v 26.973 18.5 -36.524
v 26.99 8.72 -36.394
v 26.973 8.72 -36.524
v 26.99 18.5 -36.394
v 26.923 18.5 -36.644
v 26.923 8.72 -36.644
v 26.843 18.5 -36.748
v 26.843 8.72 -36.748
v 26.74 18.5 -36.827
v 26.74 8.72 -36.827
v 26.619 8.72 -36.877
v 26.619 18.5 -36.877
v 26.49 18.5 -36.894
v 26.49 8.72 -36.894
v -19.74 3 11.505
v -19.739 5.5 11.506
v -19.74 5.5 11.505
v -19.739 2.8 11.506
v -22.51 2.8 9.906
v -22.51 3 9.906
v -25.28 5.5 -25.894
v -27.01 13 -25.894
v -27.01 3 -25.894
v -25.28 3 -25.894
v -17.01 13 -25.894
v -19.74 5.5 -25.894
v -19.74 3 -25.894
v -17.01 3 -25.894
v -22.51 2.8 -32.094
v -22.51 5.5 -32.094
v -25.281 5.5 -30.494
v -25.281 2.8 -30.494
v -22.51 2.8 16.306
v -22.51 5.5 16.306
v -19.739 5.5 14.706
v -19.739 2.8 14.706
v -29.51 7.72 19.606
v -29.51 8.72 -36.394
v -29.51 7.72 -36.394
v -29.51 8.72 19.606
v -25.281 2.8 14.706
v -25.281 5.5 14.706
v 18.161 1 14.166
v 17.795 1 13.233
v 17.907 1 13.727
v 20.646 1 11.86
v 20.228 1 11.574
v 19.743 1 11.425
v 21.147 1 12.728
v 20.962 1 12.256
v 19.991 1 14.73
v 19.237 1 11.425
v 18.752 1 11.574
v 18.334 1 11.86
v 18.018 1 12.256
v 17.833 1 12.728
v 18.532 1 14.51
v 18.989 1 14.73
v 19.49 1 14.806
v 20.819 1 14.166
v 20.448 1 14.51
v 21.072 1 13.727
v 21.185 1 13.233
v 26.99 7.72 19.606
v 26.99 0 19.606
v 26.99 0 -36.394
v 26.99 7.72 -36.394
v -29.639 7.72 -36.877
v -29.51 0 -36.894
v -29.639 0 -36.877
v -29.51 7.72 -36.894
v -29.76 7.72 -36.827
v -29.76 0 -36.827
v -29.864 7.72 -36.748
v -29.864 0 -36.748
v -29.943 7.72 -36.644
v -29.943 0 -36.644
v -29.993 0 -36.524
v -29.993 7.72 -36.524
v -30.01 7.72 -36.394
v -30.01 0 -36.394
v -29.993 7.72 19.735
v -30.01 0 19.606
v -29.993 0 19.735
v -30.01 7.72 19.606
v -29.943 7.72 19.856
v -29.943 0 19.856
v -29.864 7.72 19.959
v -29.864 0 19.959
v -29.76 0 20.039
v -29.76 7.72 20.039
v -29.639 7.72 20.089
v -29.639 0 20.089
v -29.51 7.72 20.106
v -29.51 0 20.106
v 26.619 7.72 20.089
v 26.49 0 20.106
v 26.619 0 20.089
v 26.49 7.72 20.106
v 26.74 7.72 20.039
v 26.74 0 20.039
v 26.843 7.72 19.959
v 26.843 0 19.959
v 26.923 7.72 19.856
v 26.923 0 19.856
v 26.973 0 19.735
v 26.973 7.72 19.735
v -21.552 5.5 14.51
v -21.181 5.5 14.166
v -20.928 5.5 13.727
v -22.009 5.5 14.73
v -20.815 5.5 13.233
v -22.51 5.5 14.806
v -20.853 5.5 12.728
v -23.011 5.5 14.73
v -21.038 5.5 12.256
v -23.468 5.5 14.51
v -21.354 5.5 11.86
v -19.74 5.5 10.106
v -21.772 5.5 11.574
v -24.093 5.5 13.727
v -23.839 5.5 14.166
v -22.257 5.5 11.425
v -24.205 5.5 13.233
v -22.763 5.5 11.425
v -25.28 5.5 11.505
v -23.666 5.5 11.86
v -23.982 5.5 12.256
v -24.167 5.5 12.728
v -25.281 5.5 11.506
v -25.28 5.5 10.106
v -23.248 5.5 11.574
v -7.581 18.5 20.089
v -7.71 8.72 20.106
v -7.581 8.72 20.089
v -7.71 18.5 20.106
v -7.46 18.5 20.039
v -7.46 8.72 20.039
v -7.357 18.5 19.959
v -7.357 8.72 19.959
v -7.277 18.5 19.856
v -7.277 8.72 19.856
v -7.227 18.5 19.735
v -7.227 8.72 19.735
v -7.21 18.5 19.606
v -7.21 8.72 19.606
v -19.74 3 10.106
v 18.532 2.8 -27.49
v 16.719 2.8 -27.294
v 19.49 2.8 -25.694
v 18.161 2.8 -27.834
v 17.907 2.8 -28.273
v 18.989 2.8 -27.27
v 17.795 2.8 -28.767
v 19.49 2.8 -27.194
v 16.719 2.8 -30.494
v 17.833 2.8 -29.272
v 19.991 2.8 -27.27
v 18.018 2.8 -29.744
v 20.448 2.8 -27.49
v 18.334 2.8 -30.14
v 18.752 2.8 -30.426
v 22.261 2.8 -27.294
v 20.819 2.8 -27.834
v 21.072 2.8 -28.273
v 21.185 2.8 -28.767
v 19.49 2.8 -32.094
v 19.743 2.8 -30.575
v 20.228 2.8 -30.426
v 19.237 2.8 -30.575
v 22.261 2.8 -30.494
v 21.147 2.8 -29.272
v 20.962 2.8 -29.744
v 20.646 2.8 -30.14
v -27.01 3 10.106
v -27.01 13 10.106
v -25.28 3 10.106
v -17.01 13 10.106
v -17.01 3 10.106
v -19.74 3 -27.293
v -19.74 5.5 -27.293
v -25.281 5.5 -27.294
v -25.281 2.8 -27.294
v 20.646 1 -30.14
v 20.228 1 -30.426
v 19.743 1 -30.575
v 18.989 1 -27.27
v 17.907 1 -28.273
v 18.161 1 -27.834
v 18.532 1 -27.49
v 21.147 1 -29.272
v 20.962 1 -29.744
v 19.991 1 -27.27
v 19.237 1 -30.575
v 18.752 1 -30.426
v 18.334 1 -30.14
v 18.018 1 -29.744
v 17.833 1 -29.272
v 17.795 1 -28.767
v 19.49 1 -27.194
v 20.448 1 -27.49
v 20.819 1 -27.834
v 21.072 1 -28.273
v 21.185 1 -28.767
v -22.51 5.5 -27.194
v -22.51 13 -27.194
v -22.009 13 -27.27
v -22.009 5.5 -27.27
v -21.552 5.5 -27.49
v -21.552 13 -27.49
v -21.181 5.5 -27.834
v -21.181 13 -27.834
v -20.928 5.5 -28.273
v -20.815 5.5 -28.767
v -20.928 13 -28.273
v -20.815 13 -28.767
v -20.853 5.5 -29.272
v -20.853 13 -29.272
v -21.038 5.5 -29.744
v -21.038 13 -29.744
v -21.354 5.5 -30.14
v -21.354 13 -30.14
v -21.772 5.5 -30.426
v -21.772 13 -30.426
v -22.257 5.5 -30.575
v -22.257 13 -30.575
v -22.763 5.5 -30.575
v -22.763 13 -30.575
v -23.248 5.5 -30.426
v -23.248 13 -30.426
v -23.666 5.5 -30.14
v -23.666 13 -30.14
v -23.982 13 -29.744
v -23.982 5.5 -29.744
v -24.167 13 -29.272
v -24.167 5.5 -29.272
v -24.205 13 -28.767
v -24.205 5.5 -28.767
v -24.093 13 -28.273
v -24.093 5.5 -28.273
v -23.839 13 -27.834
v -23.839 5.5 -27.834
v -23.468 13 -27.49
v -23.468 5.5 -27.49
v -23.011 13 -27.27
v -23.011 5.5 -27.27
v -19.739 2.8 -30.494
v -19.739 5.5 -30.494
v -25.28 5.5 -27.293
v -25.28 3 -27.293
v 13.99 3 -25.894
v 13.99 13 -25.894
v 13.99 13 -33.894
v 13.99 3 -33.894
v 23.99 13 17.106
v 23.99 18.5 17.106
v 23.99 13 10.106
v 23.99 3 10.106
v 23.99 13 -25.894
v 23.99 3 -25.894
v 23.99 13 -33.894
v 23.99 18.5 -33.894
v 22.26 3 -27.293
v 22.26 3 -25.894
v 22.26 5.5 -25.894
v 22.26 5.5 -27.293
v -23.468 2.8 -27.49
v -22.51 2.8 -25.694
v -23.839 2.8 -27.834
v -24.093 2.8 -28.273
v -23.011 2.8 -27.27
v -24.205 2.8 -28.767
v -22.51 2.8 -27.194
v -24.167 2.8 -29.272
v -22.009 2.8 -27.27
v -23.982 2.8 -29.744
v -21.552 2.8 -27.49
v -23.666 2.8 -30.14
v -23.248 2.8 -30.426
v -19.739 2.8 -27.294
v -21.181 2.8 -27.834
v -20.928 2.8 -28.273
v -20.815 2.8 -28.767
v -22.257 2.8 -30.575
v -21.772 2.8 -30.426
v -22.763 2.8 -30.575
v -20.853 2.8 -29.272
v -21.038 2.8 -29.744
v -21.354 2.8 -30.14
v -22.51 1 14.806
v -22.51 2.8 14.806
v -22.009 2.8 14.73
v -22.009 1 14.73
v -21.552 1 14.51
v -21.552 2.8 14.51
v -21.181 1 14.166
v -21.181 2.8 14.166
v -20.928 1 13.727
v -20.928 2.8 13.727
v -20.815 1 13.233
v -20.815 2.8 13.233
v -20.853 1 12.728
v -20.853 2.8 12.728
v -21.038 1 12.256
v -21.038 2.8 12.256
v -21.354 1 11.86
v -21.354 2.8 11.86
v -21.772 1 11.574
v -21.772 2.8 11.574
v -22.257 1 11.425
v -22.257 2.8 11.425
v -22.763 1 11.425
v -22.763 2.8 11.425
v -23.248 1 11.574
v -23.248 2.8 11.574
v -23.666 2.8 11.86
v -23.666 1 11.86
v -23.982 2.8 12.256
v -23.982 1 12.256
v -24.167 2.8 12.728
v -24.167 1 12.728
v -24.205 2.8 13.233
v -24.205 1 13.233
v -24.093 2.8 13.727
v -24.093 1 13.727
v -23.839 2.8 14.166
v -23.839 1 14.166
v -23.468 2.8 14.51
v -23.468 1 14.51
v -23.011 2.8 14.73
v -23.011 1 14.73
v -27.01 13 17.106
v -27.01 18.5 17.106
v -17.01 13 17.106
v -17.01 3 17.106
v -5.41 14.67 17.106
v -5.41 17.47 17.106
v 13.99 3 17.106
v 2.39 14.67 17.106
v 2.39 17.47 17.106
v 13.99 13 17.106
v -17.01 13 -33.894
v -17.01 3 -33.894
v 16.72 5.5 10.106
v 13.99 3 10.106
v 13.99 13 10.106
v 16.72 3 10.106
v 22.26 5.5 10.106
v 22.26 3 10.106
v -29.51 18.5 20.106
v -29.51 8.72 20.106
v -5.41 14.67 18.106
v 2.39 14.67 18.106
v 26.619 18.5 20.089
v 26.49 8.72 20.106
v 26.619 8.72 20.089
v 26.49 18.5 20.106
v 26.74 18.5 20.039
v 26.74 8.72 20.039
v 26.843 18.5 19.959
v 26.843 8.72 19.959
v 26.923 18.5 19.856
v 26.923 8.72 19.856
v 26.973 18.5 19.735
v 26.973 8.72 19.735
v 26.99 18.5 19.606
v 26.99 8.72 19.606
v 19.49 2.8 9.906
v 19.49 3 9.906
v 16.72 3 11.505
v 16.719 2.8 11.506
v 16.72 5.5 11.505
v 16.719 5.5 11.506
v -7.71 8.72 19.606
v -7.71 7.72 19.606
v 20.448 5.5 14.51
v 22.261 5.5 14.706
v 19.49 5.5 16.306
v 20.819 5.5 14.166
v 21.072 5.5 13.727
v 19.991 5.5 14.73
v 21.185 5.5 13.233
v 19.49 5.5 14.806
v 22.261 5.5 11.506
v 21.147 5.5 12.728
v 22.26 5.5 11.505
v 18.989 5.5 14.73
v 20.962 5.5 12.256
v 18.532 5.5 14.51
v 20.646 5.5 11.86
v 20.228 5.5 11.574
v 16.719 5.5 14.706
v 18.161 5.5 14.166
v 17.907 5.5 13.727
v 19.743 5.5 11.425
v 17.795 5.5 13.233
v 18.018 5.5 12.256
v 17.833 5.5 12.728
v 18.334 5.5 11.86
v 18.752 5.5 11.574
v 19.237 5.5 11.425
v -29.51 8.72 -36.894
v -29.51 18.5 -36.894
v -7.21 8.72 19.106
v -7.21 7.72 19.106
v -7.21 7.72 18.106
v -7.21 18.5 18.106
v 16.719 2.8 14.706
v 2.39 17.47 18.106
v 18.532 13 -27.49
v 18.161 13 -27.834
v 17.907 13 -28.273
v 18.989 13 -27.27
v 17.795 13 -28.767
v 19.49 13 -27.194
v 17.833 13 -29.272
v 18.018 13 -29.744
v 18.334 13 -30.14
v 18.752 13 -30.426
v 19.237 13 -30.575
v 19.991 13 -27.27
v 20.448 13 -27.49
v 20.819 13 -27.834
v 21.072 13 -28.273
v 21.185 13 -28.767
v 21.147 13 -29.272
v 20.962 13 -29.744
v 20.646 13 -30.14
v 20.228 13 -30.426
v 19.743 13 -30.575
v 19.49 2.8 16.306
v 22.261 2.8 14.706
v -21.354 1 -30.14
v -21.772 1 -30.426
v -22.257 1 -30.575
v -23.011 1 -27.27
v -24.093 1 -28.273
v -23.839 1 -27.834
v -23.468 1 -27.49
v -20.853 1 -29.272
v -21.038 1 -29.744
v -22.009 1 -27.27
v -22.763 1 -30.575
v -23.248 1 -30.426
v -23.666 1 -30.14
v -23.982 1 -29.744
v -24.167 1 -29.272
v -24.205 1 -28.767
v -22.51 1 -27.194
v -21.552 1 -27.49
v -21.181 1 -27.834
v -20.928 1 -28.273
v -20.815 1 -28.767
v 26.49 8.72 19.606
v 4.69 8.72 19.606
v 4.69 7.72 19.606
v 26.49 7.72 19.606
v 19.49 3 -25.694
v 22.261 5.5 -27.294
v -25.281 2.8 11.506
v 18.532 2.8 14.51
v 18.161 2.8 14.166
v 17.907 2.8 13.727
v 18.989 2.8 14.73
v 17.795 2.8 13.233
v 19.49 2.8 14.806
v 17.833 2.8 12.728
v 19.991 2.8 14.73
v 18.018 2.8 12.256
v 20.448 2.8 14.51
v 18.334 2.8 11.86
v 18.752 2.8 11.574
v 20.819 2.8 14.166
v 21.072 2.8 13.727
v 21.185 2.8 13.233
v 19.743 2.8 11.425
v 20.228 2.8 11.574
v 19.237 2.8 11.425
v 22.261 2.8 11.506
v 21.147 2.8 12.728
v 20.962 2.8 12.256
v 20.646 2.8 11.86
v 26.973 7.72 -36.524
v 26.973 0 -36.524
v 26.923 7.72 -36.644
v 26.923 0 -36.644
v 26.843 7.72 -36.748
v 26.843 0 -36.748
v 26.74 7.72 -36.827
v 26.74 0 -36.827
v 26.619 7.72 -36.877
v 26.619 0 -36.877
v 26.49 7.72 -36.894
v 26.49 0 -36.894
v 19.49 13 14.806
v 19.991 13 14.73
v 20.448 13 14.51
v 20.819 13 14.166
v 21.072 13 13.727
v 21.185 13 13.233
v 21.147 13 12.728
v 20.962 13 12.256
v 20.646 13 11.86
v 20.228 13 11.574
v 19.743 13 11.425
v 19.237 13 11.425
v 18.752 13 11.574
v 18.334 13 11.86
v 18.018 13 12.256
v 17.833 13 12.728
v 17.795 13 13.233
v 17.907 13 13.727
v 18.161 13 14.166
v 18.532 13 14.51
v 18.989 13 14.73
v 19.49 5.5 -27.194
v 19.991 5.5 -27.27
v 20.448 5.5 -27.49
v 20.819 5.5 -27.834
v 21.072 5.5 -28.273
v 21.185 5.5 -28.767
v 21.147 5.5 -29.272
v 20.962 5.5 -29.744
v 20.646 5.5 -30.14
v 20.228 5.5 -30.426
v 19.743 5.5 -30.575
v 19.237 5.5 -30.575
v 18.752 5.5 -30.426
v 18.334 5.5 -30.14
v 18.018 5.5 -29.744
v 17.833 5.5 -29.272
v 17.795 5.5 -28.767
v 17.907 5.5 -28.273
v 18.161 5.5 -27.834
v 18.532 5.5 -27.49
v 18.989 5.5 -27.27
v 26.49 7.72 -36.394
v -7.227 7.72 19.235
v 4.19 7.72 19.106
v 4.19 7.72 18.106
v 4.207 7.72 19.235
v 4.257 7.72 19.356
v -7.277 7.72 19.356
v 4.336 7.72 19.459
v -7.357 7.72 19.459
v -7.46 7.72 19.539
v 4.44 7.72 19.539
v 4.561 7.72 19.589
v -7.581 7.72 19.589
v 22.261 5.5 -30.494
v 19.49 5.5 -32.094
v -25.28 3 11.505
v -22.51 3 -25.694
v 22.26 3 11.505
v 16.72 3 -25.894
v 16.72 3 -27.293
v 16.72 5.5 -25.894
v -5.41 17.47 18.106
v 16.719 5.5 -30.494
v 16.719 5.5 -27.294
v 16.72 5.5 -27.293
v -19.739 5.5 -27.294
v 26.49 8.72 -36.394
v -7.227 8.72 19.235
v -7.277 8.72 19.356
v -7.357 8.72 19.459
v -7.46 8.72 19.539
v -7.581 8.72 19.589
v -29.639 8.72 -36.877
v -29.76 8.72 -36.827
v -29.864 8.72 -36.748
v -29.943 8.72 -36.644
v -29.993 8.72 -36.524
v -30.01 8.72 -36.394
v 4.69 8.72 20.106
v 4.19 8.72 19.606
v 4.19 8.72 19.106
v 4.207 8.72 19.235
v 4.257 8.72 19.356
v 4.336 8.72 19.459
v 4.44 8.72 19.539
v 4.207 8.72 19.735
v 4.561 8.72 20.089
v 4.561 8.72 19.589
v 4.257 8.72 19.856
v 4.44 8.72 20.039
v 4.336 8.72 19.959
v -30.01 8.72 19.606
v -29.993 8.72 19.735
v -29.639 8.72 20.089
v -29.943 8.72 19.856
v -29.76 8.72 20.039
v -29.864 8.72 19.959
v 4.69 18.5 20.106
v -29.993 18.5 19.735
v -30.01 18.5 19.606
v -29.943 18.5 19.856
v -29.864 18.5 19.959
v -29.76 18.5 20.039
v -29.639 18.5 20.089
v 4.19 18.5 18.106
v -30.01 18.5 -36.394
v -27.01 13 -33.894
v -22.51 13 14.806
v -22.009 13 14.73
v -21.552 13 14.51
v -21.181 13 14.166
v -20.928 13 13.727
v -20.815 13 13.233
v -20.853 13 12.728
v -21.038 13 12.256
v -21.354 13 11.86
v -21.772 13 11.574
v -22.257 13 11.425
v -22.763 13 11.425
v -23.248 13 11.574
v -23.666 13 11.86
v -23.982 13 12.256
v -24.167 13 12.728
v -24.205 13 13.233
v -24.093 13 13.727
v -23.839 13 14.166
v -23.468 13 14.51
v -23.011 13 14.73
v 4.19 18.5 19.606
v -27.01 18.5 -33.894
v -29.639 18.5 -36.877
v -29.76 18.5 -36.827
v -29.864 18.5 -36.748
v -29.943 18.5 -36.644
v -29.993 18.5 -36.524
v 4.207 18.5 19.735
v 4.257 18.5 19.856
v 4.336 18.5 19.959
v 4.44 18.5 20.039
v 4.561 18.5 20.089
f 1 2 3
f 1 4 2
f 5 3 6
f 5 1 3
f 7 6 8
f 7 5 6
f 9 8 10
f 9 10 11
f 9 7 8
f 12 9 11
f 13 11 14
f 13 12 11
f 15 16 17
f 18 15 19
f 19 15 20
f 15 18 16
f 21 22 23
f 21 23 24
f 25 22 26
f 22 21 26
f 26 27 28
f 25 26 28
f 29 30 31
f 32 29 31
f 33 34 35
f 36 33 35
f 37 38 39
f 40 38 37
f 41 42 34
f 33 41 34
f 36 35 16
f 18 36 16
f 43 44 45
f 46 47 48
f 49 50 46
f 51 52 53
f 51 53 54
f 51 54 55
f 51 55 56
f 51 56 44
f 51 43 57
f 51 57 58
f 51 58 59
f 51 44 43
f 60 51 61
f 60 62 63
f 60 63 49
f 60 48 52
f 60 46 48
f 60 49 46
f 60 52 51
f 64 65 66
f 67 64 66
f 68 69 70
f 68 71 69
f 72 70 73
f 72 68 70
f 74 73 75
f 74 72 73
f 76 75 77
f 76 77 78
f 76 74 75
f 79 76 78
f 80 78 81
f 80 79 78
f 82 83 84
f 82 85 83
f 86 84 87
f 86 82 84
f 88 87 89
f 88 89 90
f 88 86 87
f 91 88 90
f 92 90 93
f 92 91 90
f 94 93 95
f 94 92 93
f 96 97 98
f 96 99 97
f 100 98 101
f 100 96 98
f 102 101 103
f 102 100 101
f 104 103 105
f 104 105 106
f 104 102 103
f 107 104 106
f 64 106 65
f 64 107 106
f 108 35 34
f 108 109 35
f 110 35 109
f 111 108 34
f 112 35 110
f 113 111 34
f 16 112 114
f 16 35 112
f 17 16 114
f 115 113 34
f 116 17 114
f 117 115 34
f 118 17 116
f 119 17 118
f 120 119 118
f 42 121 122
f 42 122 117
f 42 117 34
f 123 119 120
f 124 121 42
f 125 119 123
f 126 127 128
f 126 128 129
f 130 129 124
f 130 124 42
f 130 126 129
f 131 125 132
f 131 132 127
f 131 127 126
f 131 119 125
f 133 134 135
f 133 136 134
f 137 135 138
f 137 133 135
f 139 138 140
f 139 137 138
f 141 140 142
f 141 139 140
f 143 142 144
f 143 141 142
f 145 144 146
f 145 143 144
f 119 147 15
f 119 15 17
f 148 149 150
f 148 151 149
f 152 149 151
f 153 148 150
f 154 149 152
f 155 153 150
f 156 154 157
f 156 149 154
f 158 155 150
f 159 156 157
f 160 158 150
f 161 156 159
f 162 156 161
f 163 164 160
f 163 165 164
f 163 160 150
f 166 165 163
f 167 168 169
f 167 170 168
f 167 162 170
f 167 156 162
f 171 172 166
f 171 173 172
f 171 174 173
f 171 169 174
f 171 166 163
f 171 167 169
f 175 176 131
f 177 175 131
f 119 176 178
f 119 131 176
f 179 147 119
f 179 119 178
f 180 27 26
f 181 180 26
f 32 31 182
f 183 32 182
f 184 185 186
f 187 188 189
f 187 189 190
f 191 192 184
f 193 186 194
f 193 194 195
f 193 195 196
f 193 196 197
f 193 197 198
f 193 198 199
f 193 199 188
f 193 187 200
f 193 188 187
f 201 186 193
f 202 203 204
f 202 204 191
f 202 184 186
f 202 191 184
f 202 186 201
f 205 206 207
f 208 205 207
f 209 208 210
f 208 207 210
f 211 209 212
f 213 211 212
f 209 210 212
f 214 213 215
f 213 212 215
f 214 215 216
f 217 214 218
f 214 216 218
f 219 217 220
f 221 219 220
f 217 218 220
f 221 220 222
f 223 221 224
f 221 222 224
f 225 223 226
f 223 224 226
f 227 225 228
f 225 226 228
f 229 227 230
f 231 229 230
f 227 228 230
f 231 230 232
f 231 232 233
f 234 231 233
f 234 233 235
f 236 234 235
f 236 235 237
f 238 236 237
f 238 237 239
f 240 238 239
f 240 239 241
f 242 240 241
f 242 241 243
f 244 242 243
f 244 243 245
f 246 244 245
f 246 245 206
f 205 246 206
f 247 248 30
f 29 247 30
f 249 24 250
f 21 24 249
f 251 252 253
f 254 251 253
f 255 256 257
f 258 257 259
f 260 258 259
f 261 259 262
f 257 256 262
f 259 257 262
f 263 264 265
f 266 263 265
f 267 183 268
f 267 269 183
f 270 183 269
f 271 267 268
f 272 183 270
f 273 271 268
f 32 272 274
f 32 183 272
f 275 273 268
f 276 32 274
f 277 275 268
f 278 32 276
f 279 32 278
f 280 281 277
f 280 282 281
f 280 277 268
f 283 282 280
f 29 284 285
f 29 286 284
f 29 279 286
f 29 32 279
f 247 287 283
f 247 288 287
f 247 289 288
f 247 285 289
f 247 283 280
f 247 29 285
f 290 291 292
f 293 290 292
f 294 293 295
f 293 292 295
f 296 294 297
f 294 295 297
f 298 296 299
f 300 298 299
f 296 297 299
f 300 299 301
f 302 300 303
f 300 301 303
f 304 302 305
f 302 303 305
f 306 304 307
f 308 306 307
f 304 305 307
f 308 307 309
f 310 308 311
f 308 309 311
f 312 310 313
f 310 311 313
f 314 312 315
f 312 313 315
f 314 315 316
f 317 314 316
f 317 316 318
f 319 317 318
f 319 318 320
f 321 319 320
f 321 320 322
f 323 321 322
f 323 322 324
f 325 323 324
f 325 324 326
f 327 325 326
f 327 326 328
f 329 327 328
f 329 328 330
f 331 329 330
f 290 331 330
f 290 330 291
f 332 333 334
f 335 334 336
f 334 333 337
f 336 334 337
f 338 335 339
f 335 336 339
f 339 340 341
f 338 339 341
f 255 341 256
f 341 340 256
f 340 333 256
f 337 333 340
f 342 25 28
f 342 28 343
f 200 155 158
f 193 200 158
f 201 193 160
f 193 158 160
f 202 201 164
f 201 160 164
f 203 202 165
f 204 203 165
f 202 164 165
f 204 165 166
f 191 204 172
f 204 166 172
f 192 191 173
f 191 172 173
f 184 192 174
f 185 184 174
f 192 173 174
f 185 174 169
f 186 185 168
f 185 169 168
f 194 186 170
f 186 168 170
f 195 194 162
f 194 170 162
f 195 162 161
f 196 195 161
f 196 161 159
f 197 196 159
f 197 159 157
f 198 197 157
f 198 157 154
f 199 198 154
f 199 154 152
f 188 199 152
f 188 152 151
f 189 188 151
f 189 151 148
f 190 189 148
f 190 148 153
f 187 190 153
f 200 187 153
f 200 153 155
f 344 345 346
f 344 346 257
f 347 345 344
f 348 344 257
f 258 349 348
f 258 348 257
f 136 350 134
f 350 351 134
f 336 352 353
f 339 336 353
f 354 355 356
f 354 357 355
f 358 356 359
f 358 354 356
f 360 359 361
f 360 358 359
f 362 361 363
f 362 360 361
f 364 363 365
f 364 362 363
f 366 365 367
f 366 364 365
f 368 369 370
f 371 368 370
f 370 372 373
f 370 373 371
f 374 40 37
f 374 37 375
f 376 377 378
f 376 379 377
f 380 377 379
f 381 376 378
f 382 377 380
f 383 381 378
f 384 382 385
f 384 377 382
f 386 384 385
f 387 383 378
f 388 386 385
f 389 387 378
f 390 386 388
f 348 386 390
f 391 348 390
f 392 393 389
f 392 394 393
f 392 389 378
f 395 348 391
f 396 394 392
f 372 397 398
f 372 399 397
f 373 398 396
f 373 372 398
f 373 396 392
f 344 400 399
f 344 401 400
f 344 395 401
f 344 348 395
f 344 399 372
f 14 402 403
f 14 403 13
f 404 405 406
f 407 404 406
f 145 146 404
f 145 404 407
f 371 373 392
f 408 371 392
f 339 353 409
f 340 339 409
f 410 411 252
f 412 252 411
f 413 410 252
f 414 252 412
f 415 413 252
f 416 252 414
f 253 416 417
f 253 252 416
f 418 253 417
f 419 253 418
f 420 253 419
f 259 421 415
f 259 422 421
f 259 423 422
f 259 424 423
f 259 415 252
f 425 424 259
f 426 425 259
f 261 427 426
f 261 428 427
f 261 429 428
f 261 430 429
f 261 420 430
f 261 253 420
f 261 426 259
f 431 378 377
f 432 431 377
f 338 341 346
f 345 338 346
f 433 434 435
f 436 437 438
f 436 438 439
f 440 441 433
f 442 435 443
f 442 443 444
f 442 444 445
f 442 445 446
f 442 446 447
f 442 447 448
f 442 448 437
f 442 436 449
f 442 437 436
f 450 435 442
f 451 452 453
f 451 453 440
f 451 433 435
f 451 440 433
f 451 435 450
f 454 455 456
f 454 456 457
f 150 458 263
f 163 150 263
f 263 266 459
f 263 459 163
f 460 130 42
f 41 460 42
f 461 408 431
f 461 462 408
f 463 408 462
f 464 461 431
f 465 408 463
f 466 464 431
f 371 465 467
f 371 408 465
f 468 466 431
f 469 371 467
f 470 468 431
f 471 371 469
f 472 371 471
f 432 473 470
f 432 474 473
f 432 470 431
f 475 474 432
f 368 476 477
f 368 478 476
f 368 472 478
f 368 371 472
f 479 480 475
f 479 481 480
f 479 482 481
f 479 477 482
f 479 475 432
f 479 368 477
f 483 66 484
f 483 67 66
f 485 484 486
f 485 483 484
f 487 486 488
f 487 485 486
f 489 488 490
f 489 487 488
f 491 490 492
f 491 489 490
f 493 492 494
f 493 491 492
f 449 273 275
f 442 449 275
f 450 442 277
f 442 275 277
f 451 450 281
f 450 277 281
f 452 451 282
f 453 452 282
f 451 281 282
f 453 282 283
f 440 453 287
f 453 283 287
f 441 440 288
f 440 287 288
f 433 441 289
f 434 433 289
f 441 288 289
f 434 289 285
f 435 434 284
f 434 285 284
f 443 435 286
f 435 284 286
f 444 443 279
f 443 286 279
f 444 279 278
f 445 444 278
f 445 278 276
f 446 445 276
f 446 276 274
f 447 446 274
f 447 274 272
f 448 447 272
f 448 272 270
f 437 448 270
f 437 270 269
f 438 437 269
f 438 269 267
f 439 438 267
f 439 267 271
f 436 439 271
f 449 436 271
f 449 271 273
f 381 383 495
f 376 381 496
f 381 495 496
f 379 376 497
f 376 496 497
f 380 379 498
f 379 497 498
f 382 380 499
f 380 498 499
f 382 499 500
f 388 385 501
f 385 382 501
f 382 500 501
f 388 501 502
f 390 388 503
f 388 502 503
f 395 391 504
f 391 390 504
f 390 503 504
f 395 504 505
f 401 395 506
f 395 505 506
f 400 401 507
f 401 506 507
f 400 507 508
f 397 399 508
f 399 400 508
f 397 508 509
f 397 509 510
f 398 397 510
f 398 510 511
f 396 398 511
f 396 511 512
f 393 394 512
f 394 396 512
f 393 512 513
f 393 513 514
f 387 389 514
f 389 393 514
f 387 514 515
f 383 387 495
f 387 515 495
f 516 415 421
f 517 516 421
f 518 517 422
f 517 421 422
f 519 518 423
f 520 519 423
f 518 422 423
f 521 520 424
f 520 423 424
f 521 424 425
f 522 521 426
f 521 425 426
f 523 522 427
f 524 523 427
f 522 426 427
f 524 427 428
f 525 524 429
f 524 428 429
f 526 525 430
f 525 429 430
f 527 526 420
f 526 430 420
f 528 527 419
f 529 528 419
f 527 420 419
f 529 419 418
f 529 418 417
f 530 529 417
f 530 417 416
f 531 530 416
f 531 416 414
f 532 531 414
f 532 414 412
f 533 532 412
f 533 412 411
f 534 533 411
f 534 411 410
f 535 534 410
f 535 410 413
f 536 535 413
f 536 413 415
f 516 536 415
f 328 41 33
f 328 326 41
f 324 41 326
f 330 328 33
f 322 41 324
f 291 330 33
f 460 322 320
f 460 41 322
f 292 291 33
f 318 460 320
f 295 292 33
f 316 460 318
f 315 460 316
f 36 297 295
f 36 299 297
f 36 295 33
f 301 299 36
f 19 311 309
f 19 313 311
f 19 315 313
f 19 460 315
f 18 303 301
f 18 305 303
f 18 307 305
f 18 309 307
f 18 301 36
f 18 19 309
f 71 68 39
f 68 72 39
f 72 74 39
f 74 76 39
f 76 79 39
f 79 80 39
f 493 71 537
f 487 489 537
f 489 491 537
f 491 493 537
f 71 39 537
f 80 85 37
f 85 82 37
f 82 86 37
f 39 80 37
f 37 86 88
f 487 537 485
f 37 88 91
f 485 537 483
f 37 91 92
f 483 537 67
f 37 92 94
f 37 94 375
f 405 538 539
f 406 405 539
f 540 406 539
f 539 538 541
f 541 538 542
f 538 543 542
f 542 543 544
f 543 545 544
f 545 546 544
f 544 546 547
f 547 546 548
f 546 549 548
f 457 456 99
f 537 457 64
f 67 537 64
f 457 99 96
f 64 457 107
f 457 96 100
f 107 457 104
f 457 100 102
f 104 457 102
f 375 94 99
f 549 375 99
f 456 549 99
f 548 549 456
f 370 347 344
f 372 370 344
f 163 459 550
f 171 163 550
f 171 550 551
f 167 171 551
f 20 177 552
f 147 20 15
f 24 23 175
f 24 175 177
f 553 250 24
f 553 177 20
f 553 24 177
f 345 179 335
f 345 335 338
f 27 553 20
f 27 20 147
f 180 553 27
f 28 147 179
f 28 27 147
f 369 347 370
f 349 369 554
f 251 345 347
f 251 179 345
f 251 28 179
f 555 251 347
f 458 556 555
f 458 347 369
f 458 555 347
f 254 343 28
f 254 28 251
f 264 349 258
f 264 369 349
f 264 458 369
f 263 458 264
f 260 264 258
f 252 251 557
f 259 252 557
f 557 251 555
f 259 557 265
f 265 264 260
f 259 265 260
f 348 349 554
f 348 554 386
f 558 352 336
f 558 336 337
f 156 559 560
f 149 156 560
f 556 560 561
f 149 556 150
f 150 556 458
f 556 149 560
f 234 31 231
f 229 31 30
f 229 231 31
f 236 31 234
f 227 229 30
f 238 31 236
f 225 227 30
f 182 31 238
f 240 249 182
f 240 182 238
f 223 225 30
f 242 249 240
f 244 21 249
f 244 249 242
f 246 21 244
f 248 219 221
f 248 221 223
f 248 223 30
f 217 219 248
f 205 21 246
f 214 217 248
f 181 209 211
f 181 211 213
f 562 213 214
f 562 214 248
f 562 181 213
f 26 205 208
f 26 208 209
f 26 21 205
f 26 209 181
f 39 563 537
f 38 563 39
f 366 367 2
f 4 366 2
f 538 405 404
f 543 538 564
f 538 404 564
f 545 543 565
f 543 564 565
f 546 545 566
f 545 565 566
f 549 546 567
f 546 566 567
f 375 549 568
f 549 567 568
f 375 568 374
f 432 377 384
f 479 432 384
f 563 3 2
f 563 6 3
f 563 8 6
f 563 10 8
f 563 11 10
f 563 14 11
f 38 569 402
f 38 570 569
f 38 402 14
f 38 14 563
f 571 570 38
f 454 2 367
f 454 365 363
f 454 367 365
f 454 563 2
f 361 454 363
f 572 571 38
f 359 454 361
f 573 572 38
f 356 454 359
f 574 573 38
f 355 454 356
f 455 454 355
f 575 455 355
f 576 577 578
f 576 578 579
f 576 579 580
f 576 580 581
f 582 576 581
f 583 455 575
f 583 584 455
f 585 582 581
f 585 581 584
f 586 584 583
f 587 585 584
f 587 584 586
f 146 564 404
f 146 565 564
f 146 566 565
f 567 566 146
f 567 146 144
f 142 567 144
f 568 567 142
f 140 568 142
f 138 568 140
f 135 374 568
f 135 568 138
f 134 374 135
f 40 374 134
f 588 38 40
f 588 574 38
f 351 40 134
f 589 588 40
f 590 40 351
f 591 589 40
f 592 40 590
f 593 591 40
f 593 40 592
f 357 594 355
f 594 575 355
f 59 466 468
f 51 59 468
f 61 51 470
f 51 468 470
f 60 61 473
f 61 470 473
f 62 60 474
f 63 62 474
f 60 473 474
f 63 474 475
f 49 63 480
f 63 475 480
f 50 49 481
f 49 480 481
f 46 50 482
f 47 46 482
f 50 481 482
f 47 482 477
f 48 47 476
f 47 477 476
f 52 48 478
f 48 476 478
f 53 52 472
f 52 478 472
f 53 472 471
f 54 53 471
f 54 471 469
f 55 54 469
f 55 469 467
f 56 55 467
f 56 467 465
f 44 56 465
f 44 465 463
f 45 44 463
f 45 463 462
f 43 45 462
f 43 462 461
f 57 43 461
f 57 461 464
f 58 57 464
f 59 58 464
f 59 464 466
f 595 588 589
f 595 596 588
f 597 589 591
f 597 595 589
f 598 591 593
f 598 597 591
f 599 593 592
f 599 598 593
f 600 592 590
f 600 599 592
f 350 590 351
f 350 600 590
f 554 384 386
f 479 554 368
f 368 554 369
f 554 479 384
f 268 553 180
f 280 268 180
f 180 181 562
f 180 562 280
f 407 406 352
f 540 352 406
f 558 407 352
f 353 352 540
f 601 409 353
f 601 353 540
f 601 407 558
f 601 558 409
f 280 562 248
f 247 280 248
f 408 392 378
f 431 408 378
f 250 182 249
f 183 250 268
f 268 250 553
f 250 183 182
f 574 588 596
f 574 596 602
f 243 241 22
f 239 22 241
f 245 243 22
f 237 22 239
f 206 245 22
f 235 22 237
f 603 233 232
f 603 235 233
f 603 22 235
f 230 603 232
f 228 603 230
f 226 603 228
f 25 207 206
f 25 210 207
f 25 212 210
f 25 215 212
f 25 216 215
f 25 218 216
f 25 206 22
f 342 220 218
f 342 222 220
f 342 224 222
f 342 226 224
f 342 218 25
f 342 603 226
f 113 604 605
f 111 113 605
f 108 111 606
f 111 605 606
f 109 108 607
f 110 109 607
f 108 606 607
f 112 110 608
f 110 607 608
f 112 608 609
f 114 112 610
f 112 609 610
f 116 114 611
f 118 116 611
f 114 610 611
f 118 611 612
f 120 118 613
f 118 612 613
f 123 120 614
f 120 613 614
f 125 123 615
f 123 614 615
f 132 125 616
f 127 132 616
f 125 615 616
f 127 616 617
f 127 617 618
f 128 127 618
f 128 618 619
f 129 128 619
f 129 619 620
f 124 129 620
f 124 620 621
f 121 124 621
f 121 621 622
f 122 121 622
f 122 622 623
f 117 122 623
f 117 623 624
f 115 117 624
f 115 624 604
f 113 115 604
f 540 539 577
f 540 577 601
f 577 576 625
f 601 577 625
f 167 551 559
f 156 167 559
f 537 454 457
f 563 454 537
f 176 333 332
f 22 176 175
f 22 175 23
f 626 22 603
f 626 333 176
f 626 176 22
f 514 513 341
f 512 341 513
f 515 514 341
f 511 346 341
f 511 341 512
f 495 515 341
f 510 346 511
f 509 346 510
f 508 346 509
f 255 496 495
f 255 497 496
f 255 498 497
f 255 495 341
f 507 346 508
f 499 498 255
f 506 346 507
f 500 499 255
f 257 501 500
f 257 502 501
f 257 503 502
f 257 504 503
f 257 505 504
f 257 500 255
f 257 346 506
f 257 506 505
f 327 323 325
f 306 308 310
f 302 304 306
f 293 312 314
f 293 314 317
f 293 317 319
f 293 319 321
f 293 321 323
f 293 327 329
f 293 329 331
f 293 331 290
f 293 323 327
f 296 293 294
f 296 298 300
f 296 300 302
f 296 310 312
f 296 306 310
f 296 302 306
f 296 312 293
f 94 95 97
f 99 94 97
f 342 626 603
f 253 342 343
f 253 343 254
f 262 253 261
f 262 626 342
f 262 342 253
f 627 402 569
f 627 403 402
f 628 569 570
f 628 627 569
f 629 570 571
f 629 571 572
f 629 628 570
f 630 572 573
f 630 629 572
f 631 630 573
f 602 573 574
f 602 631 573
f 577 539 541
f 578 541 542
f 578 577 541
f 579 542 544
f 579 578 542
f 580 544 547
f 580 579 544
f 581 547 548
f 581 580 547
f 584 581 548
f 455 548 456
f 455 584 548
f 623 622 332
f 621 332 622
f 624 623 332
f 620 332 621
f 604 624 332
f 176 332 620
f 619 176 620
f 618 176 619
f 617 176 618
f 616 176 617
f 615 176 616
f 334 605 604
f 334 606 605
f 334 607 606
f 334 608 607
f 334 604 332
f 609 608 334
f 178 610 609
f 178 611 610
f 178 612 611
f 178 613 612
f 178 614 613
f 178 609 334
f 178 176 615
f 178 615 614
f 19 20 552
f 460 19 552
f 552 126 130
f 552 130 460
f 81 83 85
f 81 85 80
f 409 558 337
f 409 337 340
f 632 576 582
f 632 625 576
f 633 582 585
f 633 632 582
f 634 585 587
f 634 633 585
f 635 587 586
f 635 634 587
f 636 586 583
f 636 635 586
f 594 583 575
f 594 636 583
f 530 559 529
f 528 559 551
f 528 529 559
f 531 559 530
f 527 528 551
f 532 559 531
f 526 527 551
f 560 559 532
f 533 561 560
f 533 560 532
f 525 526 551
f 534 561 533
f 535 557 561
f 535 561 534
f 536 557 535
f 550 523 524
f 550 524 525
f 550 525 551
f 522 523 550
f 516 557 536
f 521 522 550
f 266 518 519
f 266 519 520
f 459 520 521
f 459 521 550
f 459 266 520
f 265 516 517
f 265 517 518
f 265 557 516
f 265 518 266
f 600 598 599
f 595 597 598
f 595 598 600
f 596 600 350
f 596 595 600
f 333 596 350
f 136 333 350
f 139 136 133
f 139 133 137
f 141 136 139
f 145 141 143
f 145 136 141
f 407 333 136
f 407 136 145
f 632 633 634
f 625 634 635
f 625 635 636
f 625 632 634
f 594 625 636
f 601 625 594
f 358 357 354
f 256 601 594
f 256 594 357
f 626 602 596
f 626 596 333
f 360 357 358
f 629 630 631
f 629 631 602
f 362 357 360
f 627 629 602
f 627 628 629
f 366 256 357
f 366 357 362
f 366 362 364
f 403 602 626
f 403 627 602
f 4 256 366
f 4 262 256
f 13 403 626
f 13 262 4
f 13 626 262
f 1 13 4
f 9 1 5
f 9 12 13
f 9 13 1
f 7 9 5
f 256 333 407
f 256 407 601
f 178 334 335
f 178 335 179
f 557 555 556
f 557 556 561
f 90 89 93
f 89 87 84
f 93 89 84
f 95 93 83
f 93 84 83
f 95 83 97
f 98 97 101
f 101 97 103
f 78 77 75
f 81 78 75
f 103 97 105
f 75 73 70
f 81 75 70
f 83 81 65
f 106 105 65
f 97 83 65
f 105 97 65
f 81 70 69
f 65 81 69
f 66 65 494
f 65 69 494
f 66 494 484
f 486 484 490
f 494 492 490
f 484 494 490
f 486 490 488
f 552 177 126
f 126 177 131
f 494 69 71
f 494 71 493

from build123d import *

# Parameters (mm, degrees)
ESQUISSE1_W              = 57
ESQUISSE1_H              = 57
BOSS_EXTRU_1_DEPTH       = 18.5
ESQUISSE2_W              = 51
ESQUISSE2_H              = 51
ENL_V_MAT_EXTRU_1_DEPTH  = 15.5
ESQUISSE4_W              = 10
ESQUISSE4_H              = 8
BOSS_EXTRU_2_DEPTH       = 10
ESQUISSE5_W              = 10
ESQUISSE5_H              = 8
BOSS_EXTRU_3_DEPTH       = 10
ESQUISSE6_W              = 10
ESQUISSE6_H              = 7
BOSS_EXTRU_4_DEPTH       = 10
ESQUISSE7_W              = 10
ESQUISSE7_H              = 7
BOSS_EXTRU_5_DEPTH       = 10
ESQUISSE8_R              = 1.7
ENL_V_MAT_EXTRU_2_DEPTH  = 12
ESQUISSE9_R              = 1.7
ENL_V_MAT_EXTRU_3_DEPTH  = 12
ESQUISSE16_R             = 1.7
ENL_V_MAT_EXTRU_9_DEPTH  = 12
ESQUISSE17_R             = 1.7
ENL_V_MAT_EXTRU_10_DEPTH = 12
ESQUISSE21_W             = 7.8
ESQUISSE21_H             = 2.8
ENL_V_MAT_EXTRU_14_DEPTH = 3
ENL_V_START              = -7.5
ENL_V_MAT_EXTRU_18_DEPTH = 2.7
ENL_V_MAT_EXTRU_20_DEPTH = 2.7
ESQUISSE26_W             = 5.54
ESQUISSE26_H             = 2.5
ENL_V_MAT_EXTRU_21_DEPTH = 2.847955181
ENL_V_MAT_EXTRU_22_DEPTH = 2.7
ENL_V_MAT_EXTRU_24_DEPTH = 2.7
ESQUISSE23_W             = 5.54
ESQUISSE23_H             = 2.5
ENL_V_MAT_EXTRU_26_DEPTH = 2
ESQUISSE31_W             = 5.54
ESQUISSE31_H             = 2.5
ENL_V_MAT_EXTRU_27_DEPTH = 2
ESQUISSE30_W             = 5.54
ESQUISSE30_H             = 2.5
ENL_V_MAT_EXTRU_28_DEPTH = 2
ESQUISSE32_W             = 57
ESQUISSE32_H             = 1
ENL_V_MAT_EXTRU_29_DEPTH = 0.5
ESQUISSE33_W             = 57
ESQUISSE33_H             = 1
ENL_V_MAT_EXTRU_30_DEPTH = 0.5
ESQUISSE34_W             = 57
ESQUISSE34_H             = 1
ENL_V_MAT_EXTRU_31_DEPTH = 0.5
ESQUISSE35_W             = 57
ESQUISSE35_H             = 1
ENL_V_MAT_EXTRU_32_DEPTH = 0.5
ESQUISSE36_W             = 11.4
ESQUISSE36_H             = 10.780005484
ENL_V_MAT_EXTRU_33_DEPTH = 2
CONG_1_R                 = 0.5
CONG_2_R                 = 0.5
CONG_3_R                 = 0.5
CONG_4_R                 = 0.5
CONG_5_R                 = 0.5
CONG_6_R                 = 0.5
CONG_7_R                 = 0.5
CONG_8_R                 = 0.5
CONG_9_R                 = 0.5
CONG_10_R                = 0.5
CONG_11_R                = 0.5
CONG_12_R                = 0.5


with BuildPart() as part:
    # Esquisse1 → Boss.-Extru.1 (new body)
    with BuildSketch(Plane(origin=(0, 0, 0), x_dir=(1, 0, 0), z_dir=(0, 1, 0))):
        with Locations((-1.510072399, 8.394175698)):
            Rectangle(ESQUISSE1_W, ESQUISSE1_H)
    extrude(amount=BOSS_EXTRU_1_DEPTH)

    # Esquisse2 → Enlèv. mat.-Extru.1 (cut)
    with BuildSketch(Plane(origin=(0, 18.5, 0), x_dir=(1, 0, 0), z_dir=(0, 1, 0))):
        with Locations((-1.510072399, 8.394175698)):
            Rectangle(ESQUISSE2_W, ESQUISSE2_H)
    extrude(amount=-ENL_V_MAT_EXTRU_1_DEPTH, mode=Mode.SUBTRACT)

    # Esquisse4 → Boss.-Extru.2 (add)
    with BuildSketch(Plane(origin=(0, 3, 0), x_dir=(1, 0, 0), z_dir=(0, 1, 0))):
        with Locations((-22.010072399, 29.894175698)):
            Rectangle(ESQUISSE4_W, ESQUISSE4_H)
    extrude(amount=BOSS_EXTRU_2_DEPTH)

    # Esquisse5 → Boss.-Extru.3 (add)
    with BuildSketch(Plane(origin=(0, 3, 0), x_dir=(1, 0, 0), z_dir=(0, 1, 0))):
        with Locations((18.989927601, 29.894175698)):
            Rectangle(ESQUISSE5_W, ESQUISSE5_H)
    extrude(amount=BOSS_EXTRU_3_DEPTH)

    # Esquisse6 → Boss.-Extru.4 (add)
    with BuildSketch(Plane(origin=(0, 3, 0), x_dir=(1, 0, 0), z_dir=(0, 1, 0))):
        with Locations((18.989927601, -13.605824302)):
            Rectangle(ESQUISSE6_W, ESQUISSE6_H)
    extrude(amount=BOSS_EXTRU_4_DEPTH)

    # Esquisse7 → Boss.-Extru.5 (add)
    with BuildSketch(Plane(origin=(0, 3, 0), x_dir=(1, 0, 0), z_dir=(0, 1, 0))):
        with Locations((-22.010072399, -13.605824302)):
            Rectangle(ESQUISSE7_W, ESQUISSE7_H)
    extrude(amount=BOSS_EXTRU_5_DEPTH)

    # Esquisse8 → Enlèv. mat.-Extru.2 (cut)
    with BuildSketch(Plane(origin=(0, 13, 0), x_dir=(1, 0, 0), z_dir=(0, 1, 0))):
        with Locations(Location((19.489927601, -13.105824302, 0), (0, 0, 270))):
            Circle(ESQUISSE8_R)
    extrude(amount=-ENL_V_MAT_EXTRU_2_DEPTH, mode=Mode.SUBTRACT)

    # Esquisse9 → Enlèv. mat.-Extru.3 (cut)
    with BuildSketch(Plane(origin=(0, 13, 0), x_dir=(1, 0, 0), z_dir=(0, 1, 0))):
        with Locations(Location((-22.510072399, -13.105824302, 0), (0, 0, 270))):
            Circle(ESQUISSE9_R)
    extrude(amount=-ENL_V_MAT_EXTRU_3_DEPTH, mode=Mode.SUBTRACT)

    # Esquisse16 → Enlèv. mat.-Extru.9 (cut)
    with BuildSketch(Plane(origin=(0, 13, 0), x_dir=(1, 0, 0), z_dir=(0, 1, 0))):
        with Locations(Location((-22.510072399, 28.894175698, 0), (0, 0, 270))):
            Circle(ESQUISSE16_R)
    extrude(amount=-ENL_V_MAT_EXTRU_9_DEPTH, mode=Mode.SUBTRACT)

    # Esquisse17 → Enlèv. mat.-Extru.10 (cut)
    with BuildSketch(Plane(origin=(0, 13, 0), x_dir=(1, 0, 0), z_dir=(0, 1, 0))):
        with Locations(Location((19.489927601, 28.894175698, 0), (0, 0, 270))):
            Circle(ESQUISSE17_R)
    extrude(amount=-ENL_V_MAT_EXTRU_10_DEPTH, mode=Mode.SUBTRACT)

    # Esquisse21 → Enlèv. mat.-Extru.14 (cut)
    with BuildSketch(Plane.XY.offset(20.105824302)):
        with Locations((-1.510072399, 16.07)):
            Rectangle(ESQUISSE21_W, ESQUISSE21_H)
    extrude(amount=-ENL_V_MAT_EXTRU_14_DEPTH, mode=Mode.SUBTRACT)

    # Esquisse24 → Enlèv. mat.-Extru.18 (cut)
    with BuildSketch(Plane(origin=(0, 13, 0), x_dir=(1, 0, 0), z_dir=(0, 1, 0)).offset(ENL_V_START)):
        Polygon((19.489927601, 25.694175698), (22.261208893, 27.294175698), (22.261208893, 30.494175698), (19.489927601, 32.094175698), (16.718646309, 30.494175698), (16.718646309, 27.294175698), align=None)
    extrude(amount=-ENL_V_MAT_EXTRU_18_DEPTH, mode=Mode.SUBTRACT)

    # Esquisse25 → Enlèv. mat.-Extru.20 (cut)
    with BuildSketch(Plane(origin=(0, 13, 0), x_dir=(1, 0, 0), z_dir=(0, 1, 0)).offset(ENL_V_START)):
        Polygon((16.718646309, -11.505824302), (16.718646309, -14.705824302), (19.489927601, -16.305824302), (22.261208893, -14.705824302), (22.261208893, -11.505824302), (19.489927601, -9.905824302), align=None)
    extrude(amount=-ENL_V_MAT_EXTRU_20_DEPTH, mode=Mode.SUBTRACT)

    # Esquisse26 → Enlèv. mat.-Extru.21 (cut)
    with BuildSketch(Plane(origin=(0, 0, 10.105824302), x_dir=(-1, 0, 0), z_dir=(0, 0, -1))):
        with Locations((-19.489927601, 4.25)):
            Rectangle(ESQUISSE26_W, ESQUISSE26_H)
    extrude(amount=-ENL_V_MAT_EXTRU_21_DEPTH, mode=Mode.SUBTRACT)

    # Esquisse27 → Enlèv. mat.-Extru.22 (cut)
    with BuildSketch(Plane(origin=(0, 13, 0), x_dir=(1, 0, 0), z_dir=(0, 1, 0)).offset(ENL_V_START)):
        Polygon((-19.738791107, 27.294175698), (-19.738791107, 30.494175698), (-22.510072399, 32.094175698), (-25.281353691, 30.494175698), (-25.281353691, 27.294175698), (-22.510072399, 25.694175698), align=None)
    extrude(amount=-ENL_V_MAT_EXTRU_22_DEPTH, mode=Mode.SUBTRACT)

    # Esquisse29 → Enlèv. mat.-Extru.24 (cut)
    with BuildSketch(Plane(origin=(0, 13, 0), x_dir=(1, 0, 0), z_dir=(0, 1, 0)).offset(ENL_V_START)):
        Polygon((-19.738791107, -11.505824302), (-22.510072399, -9.905824302), (-25.281353691, -11.505824302), (-25.281353691, -14.705824302), (-22.510072399, -16.305824302), (-19.738791107, -14.705824302), align=None)
    extrude(amount=-ENL_V_MAT_EXTRU_24_DEPTH, mode=Mode.SUBTRACT)

    # Esquisse23 → Enlèv. mat.-Extru.26 (cut)
    with BuildSketch(Plane.XY.offset(-25.894175698)):
        with Locations((19.489927601, 4.25)):
            Rectangle(ESQUISSE23_W, ESQUISSE23_H)
    extrude(amount=-ENL_V_MAT_EXTRU_26_DEPTH, mode=Mode.SUBTRACT)

    # Esquisse31 → Enlèv. mat.-Extru.27 (cut)
    with BuildSketch(Plane.XY.offset(-25.894175698)):
        with Locations((-22.510072399, 4.25)):
            Rectangle(ESQUISSE31_W, ESQUISSE31_H)
    extrude(amount=-ENL_V_MAT_EXTRU_27_DEPTH, mode=Mode.SUBTRACT)

    # Esquisse30 → Enlèv. mat.-Extru.28 (cut)
    with BuildSketch(Plane(origin=(0, 0, 10.105824302), x_dir=(-1, 0, 0), z_dir=(0, 0, -1))):
        with Locations((22.510072399, 4.25)):
            Rectangle(ESQUISSE30_W, ESQUISSE30_H)
    extrude(amount=-ENL_V_MAT_EXTRU_28_DEPTH, mode=Mode.SUBTRACT)

    # Esquisse32 → Enlèv. mat.-Extru.29 (cut)
    with BuildSketch(Plane.ZY.offset(30.010072399)):
        with Locations((-8.394175698, 8.219994516)):
            Rectangle(ESQUISSE32_W, ESQUISSE32_H)
    extrude(amount=-ENL_V_MAT_EXTRU_29_DEPTH, mode=Mode.SUBTRACT)

    # Esquisse33 → Enlèv. mat.-Extru.30 (cut)
    with BuildSketch(Plane.XY.offset(20.105824302)):
        with Locations((-1.510072399, 8.219994516)):
            Rectangle(ESQUISSE33_W, ESQUISSE33_H)
    extrude(amount=-ENL_V_MAT_EXTRU_30_DEPTH, mode=Mode.SUBTRACT)

    # Esquisse34 → Enlèv. mat.-Extru.31 (cut)
    with BuildSketch(Plane(origin=(26.989927601, 0, 0), x_dir=(0, 0, -1), z_dir=(1, 0, 0))):
        with Locations((8.394175698, 8.219994516)):
            Rectangle(ESQUISSE34_W, ESQUISSE34_H)
    extrude(amount=-ENL_V_MAT_EXTRU_31_DEPTH, mode=Mode.SUBTRACT)

    # Esquisse35 → Enlèv. mat.-Extru.32 (cut)
    with BuildSketch(Plane(origin=(0, 0, -36.894175698), x_dir=(-1, 0, 0), z_dir=(0, 0, -1))):
        with Locations((1.510072399, 8.219994516)):
            Rectangle(ESQUISSE35_W, ESQUISSE35_H)
    extrude(amount=-ENL_V_MAT_EXTRU_32_DEPTH, mode=Mode.SUBTRACT)

    # Esquisse36 → Enlèv. mat.-Extru.33 (cut)
    with BuildSketch(Plane.XY.offset(20.105824302)):
        with Locations((-1.510072399, 13.109997258)):
            Rectangle(ESQUISSE36_W, ESQUISSE36_H)
    extrude(amount=-ENL_V_MAT_EXTRU_33_DEPTH, mode=Mode.SUBTRACT)

    # Congé1
    cong_1_edges = [part.edges().sort_by_distance(p)[0] for p in [
        (-7.210072399, 13.609997258, 20.105824302),
    ]]
    fillet(cong_1_edges, radius=CONG_1_R)

    # Congé2
    cong_2_edges = [part.edges().sort_by_distance(p)[0] for p in [
        (4.189927601, 13.609997258, 20.105824302),
    ]]
    fillet(cong_2_edges, radius=CONG_2_R)

    # Congé3
    cong_3_edges = [part.edges().sort_by_distance(p)[0] for p in [
        (-7.210072399, 8.219994516, 19.605824302),
    ]]
    fillet(cong_3_edges, radius=CONG_3_R)

    # Congé4
    cong_4_edges = [part.edges().sort_by_distance(p)[0] for p in [
        (4.189927601, 8.219994516, 19.605824302),
    ]]
    fillet(cong_4_edges, radius=CONG_4_R)

    # Congé5
    cong_5_edges = [part.edges().sort_by_distance(p)[0] for p in [
        (26.989927601, 13.609997258, 20.105824302),
    ]]
    fillet(cong_5_edges, radius=CONG_5_R)

    # Congé6
    cong_6_edges = [part.edges().sort_by_distance(p)[0] for p in [
        (26.989927601, 3.859997258, 20.105824302),
    ]]
    fillet(cong_6_edges, radius=CONG_6_R)

    # Congé7
    cong_7_edges = [part.edges().sort_by_distance(p)[0] for p in [
        (26.989927601, 13.609997258, -36.894175698),
    ]]
    fillet(cong_7_edges, radius=CONG_7_R)

    # Congé8
    cong_8_edges = [part.edges().sort_by_distance(p)[0] for p in [
        (26.989927601, 3.859997258, -36.894175698),
    ]]
    fillet(cong_8_edges, radius=CONG_8_R)

    # Congé9
    cong_9_edges = [part.edges().sort_by_distance(p)[0] for p in [
        (-30.010072399, 13.609997258, -36.894175698),
    ]]
    fillet(cong_9_edges, radius=CONG_9_R)

    # Congé10
    cong_10_edges = [part.edges().sort_by_distance(p)[0] for p in [
        (-30.010072399, 3.859997258, -36.894175698),
    ]]
    fillet(cong_10_edges, radius=CONG_10_R)

    # Congé11
    cong_11_edges = [part.edges().sort_by_distance(p)[0] for p in [
        (-30.010072399, 13.609997258, 20.105824302),
    ]]
    fillet(cong_11_edges, radius=CONG_11_R)

    # Congé12
    cong_12_edges = [part.edges().sort_by_distance(p)[0] for p in [
        (-30.010072399, 3.859997258, 20.105824302),
    ]]
    fillet(cong_12_edges, radius=CONG_12_R)


solid = part.part
